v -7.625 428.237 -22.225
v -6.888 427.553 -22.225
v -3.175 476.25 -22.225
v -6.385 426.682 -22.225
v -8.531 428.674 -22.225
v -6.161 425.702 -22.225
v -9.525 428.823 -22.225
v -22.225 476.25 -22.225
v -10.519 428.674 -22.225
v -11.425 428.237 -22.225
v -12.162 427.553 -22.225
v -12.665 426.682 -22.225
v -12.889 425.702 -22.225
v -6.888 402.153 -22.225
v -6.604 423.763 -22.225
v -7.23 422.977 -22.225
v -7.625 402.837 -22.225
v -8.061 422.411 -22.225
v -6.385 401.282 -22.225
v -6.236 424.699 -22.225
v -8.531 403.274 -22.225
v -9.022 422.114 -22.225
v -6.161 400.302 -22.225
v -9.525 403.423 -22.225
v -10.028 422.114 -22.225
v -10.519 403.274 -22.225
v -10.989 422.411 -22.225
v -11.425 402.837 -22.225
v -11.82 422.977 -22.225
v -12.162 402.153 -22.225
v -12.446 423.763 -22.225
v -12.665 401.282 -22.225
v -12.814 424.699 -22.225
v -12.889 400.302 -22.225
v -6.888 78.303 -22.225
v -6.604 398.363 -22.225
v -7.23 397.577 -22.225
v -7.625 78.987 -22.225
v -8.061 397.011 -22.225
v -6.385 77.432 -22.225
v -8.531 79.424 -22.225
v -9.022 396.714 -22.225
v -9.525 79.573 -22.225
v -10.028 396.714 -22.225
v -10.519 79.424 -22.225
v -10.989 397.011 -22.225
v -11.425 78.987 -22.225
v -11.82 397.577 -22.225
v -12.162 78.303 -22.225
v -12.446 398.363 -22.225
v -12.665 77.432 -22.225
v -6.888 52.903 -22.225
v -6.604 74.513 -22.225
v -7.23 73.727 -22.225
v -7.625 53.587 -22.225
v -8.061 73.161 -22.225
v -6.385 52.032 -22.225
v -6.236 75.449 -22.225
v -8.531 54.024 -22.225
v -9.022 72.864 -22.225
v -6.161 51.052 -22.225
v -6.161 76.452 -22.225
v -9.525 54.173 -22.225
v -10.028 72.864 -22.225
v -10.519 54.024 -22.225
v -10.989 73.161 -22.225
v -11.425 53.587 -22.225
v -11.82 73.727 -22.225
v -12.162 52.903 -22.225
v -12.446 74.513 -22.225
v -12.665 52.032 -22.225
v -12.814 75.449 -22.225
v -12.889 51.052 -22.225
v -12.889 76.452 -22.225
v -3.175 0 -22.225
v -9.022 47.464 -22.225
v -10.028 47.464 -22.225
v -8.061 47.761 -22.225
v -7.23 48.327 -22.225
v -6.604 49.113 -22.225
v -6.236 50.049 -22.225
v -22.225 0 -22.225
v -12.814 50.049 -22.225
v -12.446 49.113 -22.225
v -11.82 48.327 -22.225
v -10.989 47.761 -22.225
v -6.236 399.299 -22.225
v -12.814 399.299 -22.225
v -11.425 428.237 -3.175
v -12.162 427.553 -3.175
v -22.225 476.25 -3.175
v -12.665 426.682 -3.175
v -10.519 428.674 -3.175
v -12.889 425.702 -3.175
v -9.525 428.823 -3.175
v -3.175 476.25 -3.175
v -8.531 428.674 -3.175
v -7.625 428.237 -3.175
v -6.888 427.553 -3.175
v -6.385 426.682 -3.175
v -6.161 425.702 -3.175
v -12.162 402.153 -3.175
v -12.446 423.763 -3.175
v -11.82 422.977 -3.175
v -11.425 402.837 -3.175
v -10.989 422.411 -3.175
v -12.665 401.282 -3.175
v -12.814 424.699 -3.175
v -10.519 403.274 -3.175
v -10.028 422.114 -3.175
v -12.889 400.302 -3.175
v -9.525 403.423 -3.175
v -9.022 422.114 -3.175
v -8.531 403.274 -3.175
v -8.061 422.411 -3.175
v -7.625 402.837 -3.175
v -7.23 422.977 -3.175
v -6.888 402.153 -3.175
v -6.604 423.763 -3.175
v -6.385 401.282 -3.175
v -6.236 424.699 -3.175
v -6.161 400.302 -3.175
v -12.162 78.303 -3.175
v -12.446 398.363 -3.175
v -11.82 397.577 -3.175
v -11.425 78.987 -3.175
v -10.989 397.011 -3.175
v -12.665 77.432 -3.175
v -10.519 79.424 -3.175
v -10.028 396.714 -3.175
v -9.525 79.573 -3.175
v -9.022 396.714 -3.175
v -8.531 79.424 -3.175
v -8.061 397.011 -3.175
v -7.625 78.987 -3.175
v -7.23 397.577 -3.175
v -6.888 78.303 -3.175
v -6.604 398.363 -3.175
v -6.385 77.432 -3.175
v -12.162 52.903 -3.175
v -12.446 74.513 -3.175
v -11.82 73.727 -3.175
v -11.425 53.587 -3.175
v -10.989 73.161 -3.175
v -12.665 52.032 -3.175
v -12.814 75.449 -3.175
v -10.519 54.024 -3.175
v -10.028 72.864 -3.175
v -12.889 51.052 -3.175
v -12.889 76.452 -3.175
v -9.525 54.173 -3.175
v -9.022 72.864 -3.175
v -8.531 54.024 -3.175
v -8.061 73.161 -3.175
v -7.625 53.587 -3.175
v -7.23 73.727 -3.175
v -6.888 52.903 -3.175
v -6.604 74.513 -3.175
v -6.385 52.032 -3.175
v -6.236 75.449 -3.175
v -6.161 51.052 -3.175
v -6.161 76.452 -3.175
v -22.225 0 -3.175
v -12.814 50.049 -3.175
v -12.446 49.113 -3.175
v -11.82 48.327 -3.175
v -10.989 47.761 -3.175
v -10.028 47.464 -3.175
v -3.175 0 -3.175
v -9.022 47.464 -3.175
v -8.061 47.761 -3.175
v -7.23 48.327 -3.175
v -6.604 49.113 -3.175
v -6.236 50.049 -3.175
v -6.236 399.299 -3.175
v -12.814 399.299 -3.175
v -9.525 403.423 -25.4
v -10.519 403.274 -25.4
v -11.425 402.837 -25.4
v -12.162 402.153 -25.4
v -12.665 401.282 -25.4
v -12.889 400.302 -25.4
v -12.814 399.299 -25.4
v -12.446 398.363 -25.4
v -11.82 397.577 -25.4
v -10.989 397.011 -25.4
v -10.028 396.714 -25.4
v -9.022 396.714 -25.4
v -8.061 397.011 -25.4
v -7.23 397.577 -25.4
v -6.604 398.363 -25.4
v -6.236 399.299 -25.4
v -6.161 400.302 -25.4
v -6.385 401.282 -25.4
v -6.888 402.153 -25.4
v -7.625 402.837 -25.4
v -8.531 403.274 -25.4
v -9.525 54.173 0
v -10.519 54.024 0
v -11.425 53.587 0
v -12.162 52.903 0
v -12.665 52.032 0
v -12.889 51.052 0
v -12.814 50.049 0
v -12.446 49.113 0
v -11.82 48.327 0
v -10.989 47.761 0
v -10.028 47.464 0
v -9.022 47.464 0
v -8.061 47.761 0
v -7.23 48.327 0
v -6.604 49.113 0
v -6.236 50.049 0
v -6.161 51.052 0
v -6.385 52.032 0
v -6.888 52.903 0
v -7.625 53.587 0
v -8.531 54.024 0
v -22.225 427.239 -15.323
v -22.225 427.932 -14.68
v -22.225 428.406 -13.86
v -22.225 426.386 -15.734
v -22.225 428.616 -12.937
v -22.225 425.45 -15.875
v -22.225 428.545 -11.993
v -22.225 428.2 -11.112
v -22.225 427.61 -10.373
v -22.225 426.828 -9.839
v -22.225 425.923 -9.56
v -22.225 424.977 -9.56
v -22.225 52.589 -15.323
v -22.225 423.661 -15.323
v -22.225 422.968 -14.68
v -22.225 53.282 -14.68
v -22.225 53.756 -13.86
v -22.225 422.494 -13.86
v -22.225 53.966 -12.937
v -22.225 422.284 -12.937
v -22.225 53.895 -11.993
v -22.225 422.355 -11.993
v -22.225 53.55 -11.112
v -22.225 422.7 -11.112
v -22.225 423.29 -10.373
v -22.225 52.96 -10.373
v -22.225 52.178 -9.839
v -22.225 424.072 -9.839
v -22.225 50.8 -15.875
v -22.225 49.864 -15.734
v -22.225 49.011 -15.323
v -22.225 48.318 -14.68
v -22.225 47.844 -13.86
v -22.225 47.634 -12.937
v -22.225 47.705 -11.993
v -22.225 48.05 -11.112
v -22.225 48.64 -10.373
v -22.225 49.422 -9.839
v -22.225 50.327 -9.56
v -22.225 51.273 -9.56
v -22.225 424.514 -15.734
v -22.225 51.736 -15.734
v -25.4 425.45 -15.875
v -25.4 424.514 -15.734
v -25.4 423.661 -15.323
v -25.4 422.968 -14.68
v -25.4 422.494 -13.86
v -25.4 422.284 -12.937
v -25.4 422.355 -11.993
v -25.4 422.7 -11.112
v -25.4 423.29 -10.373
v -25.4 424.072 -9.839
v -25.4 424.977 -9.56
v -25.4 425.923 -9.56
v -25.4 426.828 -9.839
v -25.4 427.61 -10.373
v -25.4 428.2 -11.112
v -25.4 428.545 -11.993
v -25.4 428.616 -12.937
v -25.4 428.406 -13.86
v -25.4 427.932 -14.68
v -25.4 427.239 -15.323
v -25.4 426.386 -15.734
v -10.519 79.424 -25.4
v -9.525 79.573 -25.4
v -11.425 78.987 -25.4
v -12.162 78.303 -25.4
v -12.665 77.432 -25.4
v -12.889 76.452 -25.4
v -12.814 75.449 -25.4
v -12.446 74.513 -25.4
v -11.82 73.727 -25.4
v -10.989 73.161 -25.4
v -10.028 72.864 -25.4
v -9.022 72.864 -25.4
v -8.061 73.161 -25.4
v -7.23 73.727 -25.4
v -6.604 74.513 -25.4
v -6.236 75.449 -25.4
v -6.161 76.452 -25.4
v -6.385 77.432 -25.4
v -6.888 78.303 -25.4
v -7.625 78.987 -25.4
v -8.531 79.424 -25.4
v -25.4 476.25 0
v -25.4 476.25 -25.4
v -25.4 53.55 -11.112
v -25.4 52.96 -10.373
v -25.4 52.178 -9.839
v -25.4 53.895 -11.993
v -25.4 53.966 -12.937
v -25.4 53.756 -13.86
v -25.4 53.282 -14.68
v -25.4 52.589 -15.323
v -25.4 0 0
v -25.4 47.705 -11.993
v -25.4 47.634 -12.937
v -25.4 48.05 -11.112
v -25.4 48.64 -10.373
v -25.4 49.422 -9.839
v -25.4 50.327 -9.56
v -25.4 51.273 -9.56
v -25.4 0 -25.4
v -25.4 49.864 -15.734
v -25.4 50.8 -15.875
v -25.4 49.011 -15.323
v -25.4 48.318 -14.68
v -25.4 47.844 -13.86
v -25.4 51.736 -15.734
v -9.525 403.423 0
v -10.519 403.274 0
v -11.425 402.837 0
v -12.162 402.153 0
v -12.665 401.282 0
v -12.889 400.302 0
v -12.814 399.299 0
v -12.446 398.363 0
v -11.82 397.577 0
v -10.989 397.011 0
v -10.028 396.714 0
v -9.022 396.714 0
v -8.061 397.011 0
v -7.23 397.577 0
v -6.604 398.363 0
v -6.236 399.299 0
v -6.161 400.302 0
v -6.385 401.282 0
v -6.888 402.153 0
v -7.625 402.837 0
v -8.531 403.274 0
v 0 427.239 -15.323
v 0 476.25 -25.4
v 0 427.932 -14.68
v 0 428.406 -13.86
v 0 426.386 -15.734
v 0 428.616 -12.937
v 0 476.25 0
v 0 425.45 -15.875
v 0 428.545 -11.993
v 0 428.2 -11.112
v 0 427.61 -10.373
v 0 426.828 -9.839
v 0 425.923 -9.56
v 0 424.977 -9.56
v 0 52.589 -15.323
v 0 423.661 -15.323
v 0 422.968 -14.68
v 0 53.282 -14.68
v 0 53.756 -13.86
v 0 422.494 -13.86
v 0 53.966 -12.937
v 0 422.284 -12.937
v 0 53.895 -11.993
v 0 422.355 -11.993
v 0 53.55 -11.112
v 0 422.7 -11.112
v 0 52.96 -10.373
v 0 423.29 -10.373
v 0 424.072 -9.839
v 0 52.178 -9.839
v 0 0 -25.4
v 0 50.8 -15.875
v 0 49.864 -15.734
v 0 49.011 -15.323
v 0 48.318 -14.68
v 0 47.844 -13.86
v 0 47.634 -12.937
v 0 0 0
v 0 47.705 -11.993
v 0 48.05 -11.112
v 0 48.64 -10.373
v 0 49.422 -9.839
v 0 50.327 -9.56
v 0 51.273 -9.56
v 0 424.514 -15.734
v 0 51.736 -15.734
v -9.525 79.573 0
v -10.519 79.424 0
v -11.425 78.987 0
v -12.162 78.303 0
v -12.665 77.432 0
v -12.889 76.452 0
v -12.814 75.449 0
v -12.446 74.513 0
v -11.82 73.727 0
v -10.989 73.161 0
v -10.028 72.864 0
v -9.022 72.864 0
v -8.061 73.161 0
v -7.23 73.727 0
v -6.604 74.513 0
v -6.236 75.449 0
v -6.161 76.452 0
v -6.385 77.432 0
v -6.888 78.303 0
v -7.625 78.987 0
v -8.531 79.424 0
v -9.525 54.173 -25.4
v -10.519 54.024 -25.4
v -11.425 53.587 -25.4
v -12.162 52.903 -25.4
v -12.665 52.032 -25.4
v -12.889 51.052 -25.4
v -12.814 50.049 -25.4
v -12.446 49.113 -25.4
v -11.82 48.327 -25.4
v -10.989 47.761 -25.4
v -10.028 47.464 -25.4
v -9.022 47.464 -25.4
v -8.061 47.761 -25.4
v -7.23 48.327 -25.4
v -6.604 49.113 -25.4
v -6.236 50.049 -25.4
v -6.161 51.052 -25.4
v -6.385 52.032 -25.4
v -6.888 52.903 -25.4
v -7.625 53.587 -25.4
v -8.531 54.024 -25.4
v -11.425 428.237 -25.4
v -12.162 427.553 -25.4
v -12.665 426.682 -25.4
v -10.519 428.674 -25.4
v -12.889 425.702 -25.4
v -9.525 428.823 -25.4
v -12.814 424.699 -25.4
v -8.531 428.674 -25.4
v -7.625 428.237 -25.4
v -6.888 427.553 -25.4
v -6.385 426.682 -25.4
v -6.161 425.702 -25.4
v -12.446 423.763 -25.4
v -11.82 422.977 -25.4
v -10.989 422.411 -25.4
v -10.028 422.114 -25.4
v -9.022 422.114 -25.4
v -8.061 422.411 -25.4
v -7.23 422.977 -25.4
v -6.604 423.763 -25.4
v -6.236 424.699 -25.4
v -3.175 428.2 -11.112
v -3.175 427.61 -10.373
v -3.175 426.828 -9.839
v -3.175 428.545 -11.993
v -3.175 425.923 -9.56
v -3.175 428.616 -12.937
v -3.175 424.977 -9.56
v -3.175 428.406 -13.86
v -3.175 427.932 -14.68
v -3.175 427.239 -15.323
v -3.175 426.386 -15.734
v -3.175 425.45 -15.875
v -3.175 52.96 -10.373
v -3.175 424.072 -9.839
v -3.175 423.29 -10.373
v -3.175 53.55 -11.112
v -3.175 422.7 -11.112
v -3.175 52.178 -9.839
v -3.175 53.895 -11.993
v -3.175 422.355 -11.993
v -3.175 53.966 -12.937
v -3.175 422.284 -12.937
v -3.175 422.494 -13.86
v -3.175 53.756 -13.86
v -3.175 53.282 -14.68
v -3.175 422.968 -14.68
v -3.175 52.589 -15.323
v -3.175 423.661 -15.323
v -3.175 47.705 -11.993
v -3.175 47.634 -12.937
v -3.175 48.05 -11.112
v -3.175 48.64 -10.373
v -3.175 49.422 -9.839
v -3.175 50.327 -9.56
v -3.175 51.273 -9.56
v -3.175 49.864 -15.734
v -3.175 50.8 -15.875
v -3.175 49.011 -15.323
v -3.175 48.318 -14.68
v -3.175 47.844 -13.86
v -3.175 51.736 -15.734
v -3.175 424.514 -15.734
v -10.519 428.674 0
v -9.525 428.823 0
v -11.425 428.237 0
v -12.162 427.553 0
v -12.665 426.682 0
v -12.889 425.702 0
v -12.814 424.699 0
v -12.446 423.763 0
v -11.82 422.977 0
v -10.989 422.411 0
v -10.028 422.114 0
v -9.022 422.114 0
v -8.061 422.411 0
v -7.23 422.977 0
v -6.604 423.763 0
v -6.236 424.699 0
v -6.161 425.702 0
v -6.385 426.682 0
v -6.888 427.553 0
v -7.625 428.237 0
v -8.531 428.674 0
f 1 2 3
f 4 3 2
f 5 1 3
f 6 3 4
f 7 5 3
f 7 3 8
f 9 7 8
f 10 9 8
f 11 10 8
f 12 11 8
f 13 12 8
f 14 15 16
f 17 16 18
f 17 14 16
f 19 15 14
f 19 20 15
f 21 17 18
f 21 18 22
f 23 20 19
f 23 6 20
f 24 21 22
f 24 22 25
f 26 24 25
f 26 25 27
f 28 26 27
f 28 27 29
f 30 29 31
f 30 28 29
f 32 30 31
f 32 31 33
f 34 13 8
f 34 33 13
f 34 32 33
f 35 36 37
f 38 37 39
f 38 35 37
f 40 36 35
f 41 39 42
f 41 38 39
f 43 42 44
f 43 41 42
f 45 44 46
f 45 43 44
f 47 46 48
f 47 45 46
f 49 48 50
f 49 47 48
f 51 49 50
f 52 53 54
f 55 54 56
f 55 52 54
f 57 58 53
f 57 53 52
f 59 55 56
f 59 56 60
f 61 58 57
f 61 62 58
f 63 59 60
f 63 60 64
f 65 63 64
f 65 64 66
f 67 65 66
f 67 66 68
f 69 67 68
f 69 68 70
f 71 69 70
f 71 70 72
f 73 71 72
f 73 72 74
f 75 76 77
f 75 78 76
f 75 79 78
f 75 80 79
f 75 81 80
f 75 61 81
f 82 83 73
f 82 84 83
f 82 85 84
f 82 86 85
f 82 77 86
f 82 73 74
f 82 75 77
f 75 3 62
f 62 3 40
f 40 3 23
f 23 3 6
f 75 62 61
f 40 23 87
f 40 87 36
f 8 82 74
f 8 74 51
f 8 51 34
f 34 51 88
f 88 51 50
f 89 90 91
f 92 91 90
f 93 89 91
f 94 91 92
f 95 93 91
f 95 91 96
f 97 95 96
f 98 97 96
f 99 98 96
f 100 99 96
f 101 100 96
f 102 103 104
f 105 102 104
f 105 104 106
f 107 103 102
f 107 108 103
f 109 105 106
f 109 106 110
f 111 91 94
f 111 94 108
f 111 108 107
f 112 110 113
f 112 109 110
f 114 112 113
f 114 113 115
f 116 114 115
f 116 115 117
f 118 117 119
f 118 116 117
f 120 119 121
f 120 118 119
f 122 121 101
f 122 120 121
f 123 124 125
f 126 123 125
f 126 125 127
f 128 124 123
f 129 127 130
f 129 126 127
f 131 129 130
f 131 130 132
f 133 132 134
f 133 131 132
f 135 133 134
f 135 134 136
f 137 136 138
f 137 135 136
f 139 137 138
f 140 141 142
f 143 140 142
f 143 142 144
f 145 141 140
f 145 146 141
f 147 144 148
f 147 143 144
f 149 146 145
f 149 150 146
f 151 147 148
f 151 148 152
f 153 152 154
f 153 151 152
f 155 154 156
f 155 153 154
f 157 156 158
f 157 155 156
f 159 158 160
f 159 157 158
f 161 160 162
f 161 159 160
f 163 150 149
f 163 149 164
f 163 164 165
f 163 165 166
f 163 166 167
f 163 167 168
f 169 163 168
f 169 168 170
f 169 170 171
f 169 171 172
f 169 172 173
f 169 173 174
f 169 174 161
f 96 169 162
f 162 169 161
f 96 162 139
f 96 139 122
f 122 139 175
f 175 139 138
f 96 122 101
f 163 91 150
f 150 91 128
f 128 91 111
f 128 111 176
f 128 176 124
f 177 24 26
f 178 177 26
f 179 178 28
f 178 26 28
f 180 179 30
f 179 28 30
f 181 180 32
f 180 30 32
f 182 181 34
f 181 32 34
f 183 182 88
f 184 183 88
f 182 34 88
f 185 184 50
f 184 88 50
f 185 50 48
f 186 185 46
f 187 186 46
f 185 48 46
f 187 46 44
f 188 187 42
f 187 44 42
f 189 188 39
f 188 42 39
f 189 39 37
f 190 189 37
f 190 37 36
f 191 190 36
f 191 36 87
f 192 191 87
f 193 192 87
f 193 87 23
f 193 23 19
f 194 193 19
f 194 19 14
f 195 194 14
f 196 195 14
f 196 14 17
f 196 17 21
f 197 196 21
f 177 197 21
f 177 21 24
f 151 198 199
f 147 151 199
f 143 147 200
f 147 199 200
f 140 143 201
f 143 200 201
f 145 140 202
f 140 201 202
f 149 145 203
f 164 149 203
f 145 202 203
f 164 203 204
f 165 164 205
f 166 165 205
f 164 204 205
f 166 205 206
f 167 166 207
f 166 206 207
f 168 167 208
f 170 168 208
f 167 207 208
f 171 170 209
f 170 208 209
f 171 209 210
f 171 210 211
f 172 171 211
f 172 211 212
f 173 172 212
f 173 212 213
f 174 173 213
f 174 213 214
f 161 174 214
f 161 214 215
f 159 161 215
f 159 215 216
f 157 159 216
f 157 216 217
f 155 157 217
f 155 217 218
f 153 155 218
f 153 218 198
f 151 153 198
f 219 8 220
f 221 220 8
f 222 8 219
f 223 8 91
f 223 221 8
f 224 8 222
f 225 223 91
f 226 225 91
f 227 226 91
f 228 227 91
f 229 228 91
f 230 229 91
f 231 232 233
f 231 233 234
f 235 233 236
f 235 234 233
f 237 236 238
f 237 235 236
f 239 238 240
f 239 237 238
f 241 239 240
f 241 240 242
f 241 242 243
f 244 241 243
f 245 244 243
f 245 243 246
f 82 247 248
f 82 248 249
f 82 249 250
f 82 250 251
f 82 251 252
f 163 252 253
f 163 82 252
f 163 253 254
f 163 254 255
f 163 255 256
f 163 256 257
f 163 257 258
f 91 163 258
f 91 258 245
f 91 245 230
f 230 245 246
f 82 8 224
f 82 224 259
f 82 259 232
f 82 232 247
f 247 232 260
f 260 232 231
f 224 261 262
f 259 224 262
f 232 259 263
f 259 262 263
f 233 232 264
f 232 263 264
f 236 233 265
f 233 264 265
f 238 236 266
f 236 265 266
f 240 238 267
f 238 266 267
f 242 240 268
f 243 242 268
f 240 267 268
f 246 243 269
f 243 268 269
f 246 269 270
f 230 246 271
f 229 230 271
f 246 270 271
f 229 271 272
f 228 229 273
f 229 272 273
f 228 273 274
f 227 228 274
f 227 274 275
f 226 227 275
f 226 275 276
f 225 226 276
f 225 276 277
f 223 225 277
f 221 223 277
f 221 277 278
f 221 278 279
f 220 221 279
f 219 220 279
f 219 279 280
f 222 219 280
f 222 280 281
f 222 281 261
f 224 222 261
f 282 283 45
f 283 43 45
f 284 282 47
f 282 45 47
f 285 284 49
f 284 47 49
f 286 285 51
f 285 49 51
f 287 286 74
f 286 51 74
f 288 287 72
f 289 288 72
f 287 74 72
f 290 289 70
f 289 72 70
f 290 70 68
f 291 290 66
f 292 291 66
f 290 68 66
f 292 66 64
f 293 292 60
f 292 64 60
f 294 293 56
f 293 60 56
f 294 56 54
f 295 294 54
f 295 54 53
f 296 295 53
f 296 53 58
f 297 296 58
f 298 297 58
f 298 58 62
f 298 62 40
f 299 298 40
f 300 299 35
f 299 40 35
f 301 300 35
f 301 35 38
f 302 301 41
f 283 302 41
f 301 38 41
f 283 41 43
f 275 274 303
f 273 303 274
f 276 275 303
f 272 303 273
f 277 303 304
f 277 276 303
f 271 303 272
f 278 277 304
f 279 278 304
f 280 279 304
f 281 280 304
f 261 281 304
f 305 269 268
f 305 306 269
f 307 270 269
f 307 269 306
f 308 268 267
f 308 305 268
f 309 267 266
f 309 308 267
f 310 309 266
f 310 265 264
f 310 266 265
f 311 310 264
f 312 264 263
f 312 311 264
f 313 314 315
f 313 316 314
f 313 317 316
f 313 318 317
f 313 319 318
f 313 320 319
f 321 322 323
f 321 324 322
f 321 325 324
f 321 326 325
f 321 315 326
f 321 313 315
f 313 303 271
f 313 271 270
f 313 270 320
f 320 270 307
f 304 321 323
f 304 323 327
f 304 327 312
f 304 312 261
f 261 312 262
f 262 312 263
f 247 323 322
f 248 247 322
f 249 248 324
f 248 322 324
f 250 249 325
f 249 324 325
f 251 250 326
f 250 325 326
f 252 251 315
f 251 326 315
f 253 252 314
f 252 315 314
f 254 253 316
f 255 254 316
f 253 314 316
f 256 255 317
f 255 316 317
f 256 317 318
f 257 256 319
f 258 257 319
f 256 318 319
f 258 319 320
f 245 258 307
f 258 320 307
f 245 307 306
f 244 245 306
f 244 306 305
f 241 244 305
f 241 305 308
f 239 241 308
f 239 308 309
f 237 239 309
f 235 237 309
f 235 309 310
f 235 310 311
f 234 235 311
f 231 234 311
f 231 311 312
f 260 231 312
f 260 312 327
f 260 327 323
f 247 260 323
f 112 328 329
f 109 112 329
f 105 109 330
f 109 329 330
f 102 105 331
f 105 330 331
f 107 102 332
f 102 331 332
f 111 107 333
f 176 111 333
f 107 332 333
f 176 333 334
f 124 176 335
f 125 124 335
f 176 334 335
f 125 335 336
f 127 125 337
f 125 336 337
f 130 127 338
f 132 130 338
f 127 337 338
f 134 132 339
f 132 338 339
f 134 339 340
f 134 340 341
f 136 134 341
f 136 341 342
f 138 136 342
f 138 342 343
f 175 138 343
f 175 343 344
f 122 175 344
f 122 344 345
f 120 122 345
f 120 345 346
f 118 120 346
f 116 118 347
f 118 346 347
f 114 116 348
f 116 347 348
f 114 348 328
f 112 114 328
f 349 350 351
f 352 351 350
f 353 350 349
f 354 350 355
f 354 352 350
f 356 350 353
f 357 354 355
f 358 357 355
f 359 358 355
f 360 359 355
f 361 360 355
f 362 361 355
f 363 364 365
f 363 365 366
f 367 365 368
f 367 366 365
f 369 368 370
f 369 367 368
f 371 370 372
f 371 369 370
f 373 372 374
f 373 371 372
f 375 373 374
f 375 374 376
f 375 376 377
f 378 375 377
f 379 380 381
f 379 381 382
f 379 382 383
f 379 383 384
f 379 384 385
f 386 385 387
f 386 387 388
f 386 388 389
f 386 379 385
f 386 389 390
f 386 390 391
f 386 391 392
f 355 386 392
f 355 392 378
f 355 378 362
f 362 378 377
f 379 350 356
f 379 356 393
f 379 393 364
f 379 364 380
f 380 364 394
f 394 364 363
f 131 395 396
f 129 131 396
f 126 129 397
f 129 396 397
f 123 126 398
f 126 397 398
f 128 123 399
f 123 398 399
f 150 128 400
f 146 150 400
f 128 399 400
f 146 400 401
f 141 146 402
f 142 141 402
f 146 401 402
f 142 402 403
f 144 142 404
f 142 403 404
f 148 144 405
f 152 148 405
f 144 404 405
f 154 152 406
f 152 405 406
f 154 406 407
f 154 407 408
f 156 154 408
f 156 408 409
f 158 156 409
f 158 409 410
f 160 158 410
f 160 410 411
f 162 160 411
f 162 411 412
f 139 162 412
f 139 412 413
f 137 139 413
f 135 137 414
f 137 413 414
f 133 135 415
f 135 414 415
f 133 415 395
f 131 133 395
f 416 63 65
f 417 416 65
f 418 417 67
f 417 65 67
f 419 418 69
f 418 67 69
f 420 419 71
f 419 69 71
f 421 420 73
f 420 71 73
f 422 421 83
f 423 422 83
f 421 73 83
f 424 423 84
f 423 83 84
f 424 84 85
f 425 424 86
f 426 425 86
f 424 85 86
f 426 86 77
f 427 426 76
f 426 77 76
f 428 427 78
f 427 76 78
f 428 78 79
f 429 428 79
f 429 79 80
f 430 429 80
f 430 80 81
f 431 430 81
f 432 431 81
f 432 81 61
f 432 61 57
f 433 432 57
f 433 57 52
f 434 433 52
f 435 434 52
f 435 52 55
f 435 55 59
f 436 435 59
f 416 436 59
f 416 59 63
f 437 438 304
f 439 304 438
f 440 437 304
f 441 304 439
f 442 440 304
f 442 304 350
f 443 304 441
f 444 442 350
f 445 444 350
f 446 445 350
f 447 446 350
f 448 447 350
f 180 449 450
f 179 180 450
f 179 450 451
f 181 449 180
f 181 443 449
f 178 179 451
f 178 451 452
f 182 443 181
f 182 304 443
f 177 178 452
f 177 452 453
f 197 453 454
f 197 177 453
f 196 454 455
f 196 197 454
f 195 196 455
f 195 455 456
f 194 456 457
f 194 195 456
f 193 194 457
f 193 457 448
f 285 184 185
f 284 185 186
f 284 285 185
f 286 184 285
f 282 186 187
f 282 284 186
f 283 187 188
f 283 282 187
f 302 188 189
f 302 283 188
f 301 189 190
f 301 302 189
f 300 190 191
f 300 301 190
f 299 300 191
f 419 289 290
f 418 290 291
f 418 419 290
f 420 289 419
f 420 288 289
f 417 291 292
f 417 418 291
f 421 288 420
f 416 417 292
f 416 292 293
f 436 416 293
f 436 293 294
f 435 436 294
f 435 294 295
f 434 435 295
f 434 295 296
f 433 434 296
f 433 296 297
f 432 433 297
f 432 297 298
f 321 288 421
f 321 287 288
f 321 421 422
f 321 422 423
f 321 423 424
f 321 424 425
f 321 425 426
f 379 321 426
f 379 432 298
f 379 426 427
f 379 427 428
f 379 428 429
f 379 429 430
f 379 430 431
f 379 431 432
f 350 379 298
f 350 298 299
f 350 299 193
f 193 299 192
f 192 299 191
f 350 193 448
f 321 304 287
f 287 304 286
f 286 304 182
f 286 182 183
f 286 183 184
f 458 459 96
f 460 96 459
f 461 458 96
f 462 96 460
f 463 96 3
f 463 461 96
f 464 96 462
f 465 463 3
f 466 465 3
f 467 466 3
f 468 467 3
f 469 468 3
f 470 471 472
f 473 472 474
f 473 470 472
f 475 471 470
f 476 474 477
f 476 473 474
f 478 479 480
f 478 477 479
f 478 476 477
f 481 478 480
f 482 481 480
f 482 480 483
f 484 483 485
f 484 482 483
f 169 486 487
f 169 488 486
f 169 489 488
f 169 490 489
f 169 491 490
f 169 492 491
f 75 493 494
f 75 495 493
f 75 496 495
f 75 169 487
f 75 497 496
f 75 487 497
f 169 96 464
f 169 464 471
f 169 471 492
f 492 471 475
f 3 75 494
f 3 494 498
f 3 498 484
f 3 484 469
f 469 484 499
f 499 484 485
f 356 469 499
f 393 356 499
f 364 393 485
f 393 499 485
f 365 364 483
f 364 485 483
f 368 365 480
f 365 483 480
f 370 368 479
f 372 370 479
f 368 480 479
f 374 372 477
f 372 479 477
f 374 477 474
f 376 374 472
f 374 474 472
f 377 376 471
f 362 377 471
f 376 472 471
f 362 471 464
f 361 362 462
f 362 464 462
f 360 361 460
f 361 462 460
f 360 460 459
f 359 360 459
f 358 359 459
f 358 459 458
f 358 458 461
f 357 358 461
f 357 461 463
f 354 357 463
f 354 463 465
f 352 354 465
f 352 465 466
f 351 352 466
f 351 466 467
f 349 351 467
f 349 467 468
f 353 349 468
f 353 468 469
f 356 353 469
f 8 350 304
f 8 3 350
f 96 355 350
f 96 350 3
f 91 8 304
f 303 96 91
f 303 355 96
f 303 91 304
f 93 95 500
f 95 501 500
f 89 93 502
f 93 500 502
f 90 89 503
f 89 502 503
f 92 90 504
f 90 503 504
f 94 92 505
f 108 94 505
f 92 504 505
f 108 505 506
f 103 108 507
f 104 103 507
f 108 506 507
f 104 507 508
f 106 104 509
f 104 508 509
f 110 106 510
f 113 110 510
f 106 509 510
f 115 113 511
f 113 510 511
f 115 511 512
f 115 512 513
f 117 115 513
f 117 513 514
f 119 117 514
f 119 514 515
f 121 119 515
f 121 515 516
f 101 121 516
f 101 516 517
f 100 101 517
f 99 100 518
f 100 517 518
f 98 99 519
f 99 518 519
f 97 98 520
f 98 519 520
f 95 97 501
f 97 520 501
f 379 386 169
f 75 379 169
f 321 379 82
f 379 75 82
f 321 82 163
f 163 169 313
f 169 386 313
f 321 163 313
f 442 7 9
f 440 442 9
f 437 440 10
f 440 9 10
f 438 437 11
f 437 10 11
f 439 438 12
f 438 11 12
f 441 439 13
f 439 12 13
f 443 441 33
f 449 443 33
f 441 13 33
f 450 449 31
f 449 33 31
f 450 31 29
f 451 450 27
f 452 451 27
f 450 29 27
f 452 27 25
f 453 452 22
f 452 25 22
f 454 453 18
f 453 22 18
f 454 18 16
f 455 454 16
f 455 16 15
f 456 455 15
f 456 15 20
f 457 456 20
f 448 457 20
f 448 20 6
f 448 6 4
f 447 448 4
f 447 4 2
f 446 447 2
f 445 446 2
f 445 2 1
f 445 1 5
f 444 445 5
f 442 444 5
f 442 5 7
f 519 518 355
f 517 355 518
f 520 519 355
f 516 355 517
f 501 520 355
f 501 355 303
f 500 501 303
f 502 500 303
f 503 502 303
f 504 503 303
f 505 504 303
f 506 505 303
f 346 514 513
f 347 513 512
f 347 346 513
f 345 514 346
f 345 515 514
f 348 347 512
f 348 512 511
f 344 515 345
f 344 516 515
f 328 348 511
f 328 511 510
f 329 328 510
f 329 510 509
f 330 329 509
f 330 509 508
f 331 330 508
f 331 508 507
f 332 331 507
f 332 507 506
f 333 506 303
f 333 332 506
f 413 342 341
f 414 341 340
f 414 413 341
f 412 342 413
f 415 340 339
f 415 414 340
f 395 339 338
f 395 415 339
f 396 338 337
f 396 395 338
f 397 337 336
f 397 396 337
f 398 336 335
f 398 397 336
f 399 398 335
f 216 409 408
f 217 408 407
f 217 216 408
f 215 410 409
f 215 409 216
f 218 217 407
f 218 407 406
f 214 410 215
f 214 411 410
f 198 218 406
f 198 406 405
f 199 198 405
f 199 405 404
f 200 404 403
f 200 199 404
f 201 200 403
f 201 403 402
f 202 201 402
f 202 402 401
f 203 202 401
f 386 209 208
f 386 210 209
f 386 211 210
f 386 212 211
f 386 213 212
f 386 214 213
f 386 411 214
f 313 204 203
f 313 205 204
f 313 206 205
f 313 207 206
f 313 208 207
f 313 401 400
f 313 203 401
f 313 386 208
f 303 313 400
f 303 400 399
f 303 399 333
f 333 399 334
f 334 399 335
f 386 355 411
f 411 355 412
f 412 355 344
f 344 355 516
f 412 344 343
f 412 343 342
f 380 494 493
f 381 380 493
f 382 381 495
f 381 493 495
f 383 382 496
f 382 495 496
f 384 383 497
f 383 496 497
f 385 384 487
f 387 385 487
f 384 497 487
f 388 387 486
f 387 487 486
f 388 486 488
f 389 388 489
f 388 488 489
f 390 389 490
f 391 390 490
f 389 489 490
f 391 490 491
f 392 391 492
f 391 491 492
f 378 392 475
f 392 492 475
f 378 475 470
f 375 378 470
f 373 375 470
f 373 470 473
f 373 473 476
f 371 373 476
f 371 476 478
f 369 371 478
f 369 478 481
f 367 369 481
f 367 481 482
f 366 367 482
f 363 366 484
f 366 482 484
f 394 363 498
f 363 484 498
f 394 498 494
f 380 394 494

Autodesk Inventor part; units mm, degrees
ref_plane "YZ Plane" through (0, 0, 0) normal (1, 0, 0) x (0, 1, 0)
ref_plane "XZ Plane" through (0, 0, 0) normal (0, 1, 0) x (-1, 0, 0)
ref_plane "XY Plane" through (0, 0, 0) normal (0, 0, 1) x (1, 0, 0)
sketch "Sketch1" plane through (0, 0, 0) normal (0, 1, 0) x (-1, 0, 0)
  line L0 (0, 0) -> (25.4, 0)
  line L1 (25.4, 0) -> (25.4, -25.4)
  line L2 (25.4, -25.4) -> (0, -25.4)
  line L3 (0, -25.4) -> (0, 0)
  line L4 (22.225, -22.225) -> (22.225, -3.175)
  line L5 (22.225, -3.175) -> (3.175, -3.175)
  line L6 (3.175, -3.175) -> (3.175, -22.225)
  line L7 (3.175, -22.225) -> (22.225, -22.225)
  dimension "d0" = 25.4
  dimension "d1" = 25.4
  dimension "d2" = 3.175
extrude "Extrusion1" add sketch "Sketch1" along normal blind 476.25
sketch "Sketch2" plane through (0, 0, 0) normal (1, 0, 0) x (0, 0, -1)
  line L0 (0, 0) -> (0, 476.25) projected
  line L1 (25.4, 0) -> (0, 0) projected
  line L2 (0, 476.25) -> (25.4, 476.25) projected
  point P0 (12.7, 50.8)
  point P1 (12.7, 425.45)
  dimension "d6" = 12.7
  dimension "d9" = 12.7
  dimension "d10" = 50.8
  dimension "d12" = 50.8
hole "Hole1" at (0, 50.8, -12.7) at (0, 425.45, -12.7) direction (-1, 0, 0) diameter 6.35 end through all
sketch "Sketch3" plane through (0, 0, -25.4) normal (0, 0, -1) x (-1, 0, 0)
  line L0 (25.4, 0) -> (0, 0) projected
  line L1 (0, 476.25) -> (25.4, 476.25) projected
  line L2 (25.4, 0) -> (25.4, 476.25) projected
  point P0 (9.525, 50.8)
  point P1 (9.525, 425.45)
  point P2 (9.525, 400.05)
  point P3 (9.525, 76.2)
  dimension "d20" = 50.8
  dimension "d21" = 50.8
  dimension "d22" = 25.4
  dimension "d23" = 25.4
  dimension "d24" = 15.875
  dimension "d25" = 15.875
  dimension "d26" = 15.875
  dimension "d27" = 15.875
hole "Hole2" at (-9.525, 50.8, -25.4) at (-9.525, 425.45, -25.4) at (-9.525, 400.05, -25.4) at (-9.525, 76.2, -25.4) direction (0, 0, 1) diameter 6.7469 end through all
properties part number "15102898-16-P-0209" material "Aluminum 6061"
